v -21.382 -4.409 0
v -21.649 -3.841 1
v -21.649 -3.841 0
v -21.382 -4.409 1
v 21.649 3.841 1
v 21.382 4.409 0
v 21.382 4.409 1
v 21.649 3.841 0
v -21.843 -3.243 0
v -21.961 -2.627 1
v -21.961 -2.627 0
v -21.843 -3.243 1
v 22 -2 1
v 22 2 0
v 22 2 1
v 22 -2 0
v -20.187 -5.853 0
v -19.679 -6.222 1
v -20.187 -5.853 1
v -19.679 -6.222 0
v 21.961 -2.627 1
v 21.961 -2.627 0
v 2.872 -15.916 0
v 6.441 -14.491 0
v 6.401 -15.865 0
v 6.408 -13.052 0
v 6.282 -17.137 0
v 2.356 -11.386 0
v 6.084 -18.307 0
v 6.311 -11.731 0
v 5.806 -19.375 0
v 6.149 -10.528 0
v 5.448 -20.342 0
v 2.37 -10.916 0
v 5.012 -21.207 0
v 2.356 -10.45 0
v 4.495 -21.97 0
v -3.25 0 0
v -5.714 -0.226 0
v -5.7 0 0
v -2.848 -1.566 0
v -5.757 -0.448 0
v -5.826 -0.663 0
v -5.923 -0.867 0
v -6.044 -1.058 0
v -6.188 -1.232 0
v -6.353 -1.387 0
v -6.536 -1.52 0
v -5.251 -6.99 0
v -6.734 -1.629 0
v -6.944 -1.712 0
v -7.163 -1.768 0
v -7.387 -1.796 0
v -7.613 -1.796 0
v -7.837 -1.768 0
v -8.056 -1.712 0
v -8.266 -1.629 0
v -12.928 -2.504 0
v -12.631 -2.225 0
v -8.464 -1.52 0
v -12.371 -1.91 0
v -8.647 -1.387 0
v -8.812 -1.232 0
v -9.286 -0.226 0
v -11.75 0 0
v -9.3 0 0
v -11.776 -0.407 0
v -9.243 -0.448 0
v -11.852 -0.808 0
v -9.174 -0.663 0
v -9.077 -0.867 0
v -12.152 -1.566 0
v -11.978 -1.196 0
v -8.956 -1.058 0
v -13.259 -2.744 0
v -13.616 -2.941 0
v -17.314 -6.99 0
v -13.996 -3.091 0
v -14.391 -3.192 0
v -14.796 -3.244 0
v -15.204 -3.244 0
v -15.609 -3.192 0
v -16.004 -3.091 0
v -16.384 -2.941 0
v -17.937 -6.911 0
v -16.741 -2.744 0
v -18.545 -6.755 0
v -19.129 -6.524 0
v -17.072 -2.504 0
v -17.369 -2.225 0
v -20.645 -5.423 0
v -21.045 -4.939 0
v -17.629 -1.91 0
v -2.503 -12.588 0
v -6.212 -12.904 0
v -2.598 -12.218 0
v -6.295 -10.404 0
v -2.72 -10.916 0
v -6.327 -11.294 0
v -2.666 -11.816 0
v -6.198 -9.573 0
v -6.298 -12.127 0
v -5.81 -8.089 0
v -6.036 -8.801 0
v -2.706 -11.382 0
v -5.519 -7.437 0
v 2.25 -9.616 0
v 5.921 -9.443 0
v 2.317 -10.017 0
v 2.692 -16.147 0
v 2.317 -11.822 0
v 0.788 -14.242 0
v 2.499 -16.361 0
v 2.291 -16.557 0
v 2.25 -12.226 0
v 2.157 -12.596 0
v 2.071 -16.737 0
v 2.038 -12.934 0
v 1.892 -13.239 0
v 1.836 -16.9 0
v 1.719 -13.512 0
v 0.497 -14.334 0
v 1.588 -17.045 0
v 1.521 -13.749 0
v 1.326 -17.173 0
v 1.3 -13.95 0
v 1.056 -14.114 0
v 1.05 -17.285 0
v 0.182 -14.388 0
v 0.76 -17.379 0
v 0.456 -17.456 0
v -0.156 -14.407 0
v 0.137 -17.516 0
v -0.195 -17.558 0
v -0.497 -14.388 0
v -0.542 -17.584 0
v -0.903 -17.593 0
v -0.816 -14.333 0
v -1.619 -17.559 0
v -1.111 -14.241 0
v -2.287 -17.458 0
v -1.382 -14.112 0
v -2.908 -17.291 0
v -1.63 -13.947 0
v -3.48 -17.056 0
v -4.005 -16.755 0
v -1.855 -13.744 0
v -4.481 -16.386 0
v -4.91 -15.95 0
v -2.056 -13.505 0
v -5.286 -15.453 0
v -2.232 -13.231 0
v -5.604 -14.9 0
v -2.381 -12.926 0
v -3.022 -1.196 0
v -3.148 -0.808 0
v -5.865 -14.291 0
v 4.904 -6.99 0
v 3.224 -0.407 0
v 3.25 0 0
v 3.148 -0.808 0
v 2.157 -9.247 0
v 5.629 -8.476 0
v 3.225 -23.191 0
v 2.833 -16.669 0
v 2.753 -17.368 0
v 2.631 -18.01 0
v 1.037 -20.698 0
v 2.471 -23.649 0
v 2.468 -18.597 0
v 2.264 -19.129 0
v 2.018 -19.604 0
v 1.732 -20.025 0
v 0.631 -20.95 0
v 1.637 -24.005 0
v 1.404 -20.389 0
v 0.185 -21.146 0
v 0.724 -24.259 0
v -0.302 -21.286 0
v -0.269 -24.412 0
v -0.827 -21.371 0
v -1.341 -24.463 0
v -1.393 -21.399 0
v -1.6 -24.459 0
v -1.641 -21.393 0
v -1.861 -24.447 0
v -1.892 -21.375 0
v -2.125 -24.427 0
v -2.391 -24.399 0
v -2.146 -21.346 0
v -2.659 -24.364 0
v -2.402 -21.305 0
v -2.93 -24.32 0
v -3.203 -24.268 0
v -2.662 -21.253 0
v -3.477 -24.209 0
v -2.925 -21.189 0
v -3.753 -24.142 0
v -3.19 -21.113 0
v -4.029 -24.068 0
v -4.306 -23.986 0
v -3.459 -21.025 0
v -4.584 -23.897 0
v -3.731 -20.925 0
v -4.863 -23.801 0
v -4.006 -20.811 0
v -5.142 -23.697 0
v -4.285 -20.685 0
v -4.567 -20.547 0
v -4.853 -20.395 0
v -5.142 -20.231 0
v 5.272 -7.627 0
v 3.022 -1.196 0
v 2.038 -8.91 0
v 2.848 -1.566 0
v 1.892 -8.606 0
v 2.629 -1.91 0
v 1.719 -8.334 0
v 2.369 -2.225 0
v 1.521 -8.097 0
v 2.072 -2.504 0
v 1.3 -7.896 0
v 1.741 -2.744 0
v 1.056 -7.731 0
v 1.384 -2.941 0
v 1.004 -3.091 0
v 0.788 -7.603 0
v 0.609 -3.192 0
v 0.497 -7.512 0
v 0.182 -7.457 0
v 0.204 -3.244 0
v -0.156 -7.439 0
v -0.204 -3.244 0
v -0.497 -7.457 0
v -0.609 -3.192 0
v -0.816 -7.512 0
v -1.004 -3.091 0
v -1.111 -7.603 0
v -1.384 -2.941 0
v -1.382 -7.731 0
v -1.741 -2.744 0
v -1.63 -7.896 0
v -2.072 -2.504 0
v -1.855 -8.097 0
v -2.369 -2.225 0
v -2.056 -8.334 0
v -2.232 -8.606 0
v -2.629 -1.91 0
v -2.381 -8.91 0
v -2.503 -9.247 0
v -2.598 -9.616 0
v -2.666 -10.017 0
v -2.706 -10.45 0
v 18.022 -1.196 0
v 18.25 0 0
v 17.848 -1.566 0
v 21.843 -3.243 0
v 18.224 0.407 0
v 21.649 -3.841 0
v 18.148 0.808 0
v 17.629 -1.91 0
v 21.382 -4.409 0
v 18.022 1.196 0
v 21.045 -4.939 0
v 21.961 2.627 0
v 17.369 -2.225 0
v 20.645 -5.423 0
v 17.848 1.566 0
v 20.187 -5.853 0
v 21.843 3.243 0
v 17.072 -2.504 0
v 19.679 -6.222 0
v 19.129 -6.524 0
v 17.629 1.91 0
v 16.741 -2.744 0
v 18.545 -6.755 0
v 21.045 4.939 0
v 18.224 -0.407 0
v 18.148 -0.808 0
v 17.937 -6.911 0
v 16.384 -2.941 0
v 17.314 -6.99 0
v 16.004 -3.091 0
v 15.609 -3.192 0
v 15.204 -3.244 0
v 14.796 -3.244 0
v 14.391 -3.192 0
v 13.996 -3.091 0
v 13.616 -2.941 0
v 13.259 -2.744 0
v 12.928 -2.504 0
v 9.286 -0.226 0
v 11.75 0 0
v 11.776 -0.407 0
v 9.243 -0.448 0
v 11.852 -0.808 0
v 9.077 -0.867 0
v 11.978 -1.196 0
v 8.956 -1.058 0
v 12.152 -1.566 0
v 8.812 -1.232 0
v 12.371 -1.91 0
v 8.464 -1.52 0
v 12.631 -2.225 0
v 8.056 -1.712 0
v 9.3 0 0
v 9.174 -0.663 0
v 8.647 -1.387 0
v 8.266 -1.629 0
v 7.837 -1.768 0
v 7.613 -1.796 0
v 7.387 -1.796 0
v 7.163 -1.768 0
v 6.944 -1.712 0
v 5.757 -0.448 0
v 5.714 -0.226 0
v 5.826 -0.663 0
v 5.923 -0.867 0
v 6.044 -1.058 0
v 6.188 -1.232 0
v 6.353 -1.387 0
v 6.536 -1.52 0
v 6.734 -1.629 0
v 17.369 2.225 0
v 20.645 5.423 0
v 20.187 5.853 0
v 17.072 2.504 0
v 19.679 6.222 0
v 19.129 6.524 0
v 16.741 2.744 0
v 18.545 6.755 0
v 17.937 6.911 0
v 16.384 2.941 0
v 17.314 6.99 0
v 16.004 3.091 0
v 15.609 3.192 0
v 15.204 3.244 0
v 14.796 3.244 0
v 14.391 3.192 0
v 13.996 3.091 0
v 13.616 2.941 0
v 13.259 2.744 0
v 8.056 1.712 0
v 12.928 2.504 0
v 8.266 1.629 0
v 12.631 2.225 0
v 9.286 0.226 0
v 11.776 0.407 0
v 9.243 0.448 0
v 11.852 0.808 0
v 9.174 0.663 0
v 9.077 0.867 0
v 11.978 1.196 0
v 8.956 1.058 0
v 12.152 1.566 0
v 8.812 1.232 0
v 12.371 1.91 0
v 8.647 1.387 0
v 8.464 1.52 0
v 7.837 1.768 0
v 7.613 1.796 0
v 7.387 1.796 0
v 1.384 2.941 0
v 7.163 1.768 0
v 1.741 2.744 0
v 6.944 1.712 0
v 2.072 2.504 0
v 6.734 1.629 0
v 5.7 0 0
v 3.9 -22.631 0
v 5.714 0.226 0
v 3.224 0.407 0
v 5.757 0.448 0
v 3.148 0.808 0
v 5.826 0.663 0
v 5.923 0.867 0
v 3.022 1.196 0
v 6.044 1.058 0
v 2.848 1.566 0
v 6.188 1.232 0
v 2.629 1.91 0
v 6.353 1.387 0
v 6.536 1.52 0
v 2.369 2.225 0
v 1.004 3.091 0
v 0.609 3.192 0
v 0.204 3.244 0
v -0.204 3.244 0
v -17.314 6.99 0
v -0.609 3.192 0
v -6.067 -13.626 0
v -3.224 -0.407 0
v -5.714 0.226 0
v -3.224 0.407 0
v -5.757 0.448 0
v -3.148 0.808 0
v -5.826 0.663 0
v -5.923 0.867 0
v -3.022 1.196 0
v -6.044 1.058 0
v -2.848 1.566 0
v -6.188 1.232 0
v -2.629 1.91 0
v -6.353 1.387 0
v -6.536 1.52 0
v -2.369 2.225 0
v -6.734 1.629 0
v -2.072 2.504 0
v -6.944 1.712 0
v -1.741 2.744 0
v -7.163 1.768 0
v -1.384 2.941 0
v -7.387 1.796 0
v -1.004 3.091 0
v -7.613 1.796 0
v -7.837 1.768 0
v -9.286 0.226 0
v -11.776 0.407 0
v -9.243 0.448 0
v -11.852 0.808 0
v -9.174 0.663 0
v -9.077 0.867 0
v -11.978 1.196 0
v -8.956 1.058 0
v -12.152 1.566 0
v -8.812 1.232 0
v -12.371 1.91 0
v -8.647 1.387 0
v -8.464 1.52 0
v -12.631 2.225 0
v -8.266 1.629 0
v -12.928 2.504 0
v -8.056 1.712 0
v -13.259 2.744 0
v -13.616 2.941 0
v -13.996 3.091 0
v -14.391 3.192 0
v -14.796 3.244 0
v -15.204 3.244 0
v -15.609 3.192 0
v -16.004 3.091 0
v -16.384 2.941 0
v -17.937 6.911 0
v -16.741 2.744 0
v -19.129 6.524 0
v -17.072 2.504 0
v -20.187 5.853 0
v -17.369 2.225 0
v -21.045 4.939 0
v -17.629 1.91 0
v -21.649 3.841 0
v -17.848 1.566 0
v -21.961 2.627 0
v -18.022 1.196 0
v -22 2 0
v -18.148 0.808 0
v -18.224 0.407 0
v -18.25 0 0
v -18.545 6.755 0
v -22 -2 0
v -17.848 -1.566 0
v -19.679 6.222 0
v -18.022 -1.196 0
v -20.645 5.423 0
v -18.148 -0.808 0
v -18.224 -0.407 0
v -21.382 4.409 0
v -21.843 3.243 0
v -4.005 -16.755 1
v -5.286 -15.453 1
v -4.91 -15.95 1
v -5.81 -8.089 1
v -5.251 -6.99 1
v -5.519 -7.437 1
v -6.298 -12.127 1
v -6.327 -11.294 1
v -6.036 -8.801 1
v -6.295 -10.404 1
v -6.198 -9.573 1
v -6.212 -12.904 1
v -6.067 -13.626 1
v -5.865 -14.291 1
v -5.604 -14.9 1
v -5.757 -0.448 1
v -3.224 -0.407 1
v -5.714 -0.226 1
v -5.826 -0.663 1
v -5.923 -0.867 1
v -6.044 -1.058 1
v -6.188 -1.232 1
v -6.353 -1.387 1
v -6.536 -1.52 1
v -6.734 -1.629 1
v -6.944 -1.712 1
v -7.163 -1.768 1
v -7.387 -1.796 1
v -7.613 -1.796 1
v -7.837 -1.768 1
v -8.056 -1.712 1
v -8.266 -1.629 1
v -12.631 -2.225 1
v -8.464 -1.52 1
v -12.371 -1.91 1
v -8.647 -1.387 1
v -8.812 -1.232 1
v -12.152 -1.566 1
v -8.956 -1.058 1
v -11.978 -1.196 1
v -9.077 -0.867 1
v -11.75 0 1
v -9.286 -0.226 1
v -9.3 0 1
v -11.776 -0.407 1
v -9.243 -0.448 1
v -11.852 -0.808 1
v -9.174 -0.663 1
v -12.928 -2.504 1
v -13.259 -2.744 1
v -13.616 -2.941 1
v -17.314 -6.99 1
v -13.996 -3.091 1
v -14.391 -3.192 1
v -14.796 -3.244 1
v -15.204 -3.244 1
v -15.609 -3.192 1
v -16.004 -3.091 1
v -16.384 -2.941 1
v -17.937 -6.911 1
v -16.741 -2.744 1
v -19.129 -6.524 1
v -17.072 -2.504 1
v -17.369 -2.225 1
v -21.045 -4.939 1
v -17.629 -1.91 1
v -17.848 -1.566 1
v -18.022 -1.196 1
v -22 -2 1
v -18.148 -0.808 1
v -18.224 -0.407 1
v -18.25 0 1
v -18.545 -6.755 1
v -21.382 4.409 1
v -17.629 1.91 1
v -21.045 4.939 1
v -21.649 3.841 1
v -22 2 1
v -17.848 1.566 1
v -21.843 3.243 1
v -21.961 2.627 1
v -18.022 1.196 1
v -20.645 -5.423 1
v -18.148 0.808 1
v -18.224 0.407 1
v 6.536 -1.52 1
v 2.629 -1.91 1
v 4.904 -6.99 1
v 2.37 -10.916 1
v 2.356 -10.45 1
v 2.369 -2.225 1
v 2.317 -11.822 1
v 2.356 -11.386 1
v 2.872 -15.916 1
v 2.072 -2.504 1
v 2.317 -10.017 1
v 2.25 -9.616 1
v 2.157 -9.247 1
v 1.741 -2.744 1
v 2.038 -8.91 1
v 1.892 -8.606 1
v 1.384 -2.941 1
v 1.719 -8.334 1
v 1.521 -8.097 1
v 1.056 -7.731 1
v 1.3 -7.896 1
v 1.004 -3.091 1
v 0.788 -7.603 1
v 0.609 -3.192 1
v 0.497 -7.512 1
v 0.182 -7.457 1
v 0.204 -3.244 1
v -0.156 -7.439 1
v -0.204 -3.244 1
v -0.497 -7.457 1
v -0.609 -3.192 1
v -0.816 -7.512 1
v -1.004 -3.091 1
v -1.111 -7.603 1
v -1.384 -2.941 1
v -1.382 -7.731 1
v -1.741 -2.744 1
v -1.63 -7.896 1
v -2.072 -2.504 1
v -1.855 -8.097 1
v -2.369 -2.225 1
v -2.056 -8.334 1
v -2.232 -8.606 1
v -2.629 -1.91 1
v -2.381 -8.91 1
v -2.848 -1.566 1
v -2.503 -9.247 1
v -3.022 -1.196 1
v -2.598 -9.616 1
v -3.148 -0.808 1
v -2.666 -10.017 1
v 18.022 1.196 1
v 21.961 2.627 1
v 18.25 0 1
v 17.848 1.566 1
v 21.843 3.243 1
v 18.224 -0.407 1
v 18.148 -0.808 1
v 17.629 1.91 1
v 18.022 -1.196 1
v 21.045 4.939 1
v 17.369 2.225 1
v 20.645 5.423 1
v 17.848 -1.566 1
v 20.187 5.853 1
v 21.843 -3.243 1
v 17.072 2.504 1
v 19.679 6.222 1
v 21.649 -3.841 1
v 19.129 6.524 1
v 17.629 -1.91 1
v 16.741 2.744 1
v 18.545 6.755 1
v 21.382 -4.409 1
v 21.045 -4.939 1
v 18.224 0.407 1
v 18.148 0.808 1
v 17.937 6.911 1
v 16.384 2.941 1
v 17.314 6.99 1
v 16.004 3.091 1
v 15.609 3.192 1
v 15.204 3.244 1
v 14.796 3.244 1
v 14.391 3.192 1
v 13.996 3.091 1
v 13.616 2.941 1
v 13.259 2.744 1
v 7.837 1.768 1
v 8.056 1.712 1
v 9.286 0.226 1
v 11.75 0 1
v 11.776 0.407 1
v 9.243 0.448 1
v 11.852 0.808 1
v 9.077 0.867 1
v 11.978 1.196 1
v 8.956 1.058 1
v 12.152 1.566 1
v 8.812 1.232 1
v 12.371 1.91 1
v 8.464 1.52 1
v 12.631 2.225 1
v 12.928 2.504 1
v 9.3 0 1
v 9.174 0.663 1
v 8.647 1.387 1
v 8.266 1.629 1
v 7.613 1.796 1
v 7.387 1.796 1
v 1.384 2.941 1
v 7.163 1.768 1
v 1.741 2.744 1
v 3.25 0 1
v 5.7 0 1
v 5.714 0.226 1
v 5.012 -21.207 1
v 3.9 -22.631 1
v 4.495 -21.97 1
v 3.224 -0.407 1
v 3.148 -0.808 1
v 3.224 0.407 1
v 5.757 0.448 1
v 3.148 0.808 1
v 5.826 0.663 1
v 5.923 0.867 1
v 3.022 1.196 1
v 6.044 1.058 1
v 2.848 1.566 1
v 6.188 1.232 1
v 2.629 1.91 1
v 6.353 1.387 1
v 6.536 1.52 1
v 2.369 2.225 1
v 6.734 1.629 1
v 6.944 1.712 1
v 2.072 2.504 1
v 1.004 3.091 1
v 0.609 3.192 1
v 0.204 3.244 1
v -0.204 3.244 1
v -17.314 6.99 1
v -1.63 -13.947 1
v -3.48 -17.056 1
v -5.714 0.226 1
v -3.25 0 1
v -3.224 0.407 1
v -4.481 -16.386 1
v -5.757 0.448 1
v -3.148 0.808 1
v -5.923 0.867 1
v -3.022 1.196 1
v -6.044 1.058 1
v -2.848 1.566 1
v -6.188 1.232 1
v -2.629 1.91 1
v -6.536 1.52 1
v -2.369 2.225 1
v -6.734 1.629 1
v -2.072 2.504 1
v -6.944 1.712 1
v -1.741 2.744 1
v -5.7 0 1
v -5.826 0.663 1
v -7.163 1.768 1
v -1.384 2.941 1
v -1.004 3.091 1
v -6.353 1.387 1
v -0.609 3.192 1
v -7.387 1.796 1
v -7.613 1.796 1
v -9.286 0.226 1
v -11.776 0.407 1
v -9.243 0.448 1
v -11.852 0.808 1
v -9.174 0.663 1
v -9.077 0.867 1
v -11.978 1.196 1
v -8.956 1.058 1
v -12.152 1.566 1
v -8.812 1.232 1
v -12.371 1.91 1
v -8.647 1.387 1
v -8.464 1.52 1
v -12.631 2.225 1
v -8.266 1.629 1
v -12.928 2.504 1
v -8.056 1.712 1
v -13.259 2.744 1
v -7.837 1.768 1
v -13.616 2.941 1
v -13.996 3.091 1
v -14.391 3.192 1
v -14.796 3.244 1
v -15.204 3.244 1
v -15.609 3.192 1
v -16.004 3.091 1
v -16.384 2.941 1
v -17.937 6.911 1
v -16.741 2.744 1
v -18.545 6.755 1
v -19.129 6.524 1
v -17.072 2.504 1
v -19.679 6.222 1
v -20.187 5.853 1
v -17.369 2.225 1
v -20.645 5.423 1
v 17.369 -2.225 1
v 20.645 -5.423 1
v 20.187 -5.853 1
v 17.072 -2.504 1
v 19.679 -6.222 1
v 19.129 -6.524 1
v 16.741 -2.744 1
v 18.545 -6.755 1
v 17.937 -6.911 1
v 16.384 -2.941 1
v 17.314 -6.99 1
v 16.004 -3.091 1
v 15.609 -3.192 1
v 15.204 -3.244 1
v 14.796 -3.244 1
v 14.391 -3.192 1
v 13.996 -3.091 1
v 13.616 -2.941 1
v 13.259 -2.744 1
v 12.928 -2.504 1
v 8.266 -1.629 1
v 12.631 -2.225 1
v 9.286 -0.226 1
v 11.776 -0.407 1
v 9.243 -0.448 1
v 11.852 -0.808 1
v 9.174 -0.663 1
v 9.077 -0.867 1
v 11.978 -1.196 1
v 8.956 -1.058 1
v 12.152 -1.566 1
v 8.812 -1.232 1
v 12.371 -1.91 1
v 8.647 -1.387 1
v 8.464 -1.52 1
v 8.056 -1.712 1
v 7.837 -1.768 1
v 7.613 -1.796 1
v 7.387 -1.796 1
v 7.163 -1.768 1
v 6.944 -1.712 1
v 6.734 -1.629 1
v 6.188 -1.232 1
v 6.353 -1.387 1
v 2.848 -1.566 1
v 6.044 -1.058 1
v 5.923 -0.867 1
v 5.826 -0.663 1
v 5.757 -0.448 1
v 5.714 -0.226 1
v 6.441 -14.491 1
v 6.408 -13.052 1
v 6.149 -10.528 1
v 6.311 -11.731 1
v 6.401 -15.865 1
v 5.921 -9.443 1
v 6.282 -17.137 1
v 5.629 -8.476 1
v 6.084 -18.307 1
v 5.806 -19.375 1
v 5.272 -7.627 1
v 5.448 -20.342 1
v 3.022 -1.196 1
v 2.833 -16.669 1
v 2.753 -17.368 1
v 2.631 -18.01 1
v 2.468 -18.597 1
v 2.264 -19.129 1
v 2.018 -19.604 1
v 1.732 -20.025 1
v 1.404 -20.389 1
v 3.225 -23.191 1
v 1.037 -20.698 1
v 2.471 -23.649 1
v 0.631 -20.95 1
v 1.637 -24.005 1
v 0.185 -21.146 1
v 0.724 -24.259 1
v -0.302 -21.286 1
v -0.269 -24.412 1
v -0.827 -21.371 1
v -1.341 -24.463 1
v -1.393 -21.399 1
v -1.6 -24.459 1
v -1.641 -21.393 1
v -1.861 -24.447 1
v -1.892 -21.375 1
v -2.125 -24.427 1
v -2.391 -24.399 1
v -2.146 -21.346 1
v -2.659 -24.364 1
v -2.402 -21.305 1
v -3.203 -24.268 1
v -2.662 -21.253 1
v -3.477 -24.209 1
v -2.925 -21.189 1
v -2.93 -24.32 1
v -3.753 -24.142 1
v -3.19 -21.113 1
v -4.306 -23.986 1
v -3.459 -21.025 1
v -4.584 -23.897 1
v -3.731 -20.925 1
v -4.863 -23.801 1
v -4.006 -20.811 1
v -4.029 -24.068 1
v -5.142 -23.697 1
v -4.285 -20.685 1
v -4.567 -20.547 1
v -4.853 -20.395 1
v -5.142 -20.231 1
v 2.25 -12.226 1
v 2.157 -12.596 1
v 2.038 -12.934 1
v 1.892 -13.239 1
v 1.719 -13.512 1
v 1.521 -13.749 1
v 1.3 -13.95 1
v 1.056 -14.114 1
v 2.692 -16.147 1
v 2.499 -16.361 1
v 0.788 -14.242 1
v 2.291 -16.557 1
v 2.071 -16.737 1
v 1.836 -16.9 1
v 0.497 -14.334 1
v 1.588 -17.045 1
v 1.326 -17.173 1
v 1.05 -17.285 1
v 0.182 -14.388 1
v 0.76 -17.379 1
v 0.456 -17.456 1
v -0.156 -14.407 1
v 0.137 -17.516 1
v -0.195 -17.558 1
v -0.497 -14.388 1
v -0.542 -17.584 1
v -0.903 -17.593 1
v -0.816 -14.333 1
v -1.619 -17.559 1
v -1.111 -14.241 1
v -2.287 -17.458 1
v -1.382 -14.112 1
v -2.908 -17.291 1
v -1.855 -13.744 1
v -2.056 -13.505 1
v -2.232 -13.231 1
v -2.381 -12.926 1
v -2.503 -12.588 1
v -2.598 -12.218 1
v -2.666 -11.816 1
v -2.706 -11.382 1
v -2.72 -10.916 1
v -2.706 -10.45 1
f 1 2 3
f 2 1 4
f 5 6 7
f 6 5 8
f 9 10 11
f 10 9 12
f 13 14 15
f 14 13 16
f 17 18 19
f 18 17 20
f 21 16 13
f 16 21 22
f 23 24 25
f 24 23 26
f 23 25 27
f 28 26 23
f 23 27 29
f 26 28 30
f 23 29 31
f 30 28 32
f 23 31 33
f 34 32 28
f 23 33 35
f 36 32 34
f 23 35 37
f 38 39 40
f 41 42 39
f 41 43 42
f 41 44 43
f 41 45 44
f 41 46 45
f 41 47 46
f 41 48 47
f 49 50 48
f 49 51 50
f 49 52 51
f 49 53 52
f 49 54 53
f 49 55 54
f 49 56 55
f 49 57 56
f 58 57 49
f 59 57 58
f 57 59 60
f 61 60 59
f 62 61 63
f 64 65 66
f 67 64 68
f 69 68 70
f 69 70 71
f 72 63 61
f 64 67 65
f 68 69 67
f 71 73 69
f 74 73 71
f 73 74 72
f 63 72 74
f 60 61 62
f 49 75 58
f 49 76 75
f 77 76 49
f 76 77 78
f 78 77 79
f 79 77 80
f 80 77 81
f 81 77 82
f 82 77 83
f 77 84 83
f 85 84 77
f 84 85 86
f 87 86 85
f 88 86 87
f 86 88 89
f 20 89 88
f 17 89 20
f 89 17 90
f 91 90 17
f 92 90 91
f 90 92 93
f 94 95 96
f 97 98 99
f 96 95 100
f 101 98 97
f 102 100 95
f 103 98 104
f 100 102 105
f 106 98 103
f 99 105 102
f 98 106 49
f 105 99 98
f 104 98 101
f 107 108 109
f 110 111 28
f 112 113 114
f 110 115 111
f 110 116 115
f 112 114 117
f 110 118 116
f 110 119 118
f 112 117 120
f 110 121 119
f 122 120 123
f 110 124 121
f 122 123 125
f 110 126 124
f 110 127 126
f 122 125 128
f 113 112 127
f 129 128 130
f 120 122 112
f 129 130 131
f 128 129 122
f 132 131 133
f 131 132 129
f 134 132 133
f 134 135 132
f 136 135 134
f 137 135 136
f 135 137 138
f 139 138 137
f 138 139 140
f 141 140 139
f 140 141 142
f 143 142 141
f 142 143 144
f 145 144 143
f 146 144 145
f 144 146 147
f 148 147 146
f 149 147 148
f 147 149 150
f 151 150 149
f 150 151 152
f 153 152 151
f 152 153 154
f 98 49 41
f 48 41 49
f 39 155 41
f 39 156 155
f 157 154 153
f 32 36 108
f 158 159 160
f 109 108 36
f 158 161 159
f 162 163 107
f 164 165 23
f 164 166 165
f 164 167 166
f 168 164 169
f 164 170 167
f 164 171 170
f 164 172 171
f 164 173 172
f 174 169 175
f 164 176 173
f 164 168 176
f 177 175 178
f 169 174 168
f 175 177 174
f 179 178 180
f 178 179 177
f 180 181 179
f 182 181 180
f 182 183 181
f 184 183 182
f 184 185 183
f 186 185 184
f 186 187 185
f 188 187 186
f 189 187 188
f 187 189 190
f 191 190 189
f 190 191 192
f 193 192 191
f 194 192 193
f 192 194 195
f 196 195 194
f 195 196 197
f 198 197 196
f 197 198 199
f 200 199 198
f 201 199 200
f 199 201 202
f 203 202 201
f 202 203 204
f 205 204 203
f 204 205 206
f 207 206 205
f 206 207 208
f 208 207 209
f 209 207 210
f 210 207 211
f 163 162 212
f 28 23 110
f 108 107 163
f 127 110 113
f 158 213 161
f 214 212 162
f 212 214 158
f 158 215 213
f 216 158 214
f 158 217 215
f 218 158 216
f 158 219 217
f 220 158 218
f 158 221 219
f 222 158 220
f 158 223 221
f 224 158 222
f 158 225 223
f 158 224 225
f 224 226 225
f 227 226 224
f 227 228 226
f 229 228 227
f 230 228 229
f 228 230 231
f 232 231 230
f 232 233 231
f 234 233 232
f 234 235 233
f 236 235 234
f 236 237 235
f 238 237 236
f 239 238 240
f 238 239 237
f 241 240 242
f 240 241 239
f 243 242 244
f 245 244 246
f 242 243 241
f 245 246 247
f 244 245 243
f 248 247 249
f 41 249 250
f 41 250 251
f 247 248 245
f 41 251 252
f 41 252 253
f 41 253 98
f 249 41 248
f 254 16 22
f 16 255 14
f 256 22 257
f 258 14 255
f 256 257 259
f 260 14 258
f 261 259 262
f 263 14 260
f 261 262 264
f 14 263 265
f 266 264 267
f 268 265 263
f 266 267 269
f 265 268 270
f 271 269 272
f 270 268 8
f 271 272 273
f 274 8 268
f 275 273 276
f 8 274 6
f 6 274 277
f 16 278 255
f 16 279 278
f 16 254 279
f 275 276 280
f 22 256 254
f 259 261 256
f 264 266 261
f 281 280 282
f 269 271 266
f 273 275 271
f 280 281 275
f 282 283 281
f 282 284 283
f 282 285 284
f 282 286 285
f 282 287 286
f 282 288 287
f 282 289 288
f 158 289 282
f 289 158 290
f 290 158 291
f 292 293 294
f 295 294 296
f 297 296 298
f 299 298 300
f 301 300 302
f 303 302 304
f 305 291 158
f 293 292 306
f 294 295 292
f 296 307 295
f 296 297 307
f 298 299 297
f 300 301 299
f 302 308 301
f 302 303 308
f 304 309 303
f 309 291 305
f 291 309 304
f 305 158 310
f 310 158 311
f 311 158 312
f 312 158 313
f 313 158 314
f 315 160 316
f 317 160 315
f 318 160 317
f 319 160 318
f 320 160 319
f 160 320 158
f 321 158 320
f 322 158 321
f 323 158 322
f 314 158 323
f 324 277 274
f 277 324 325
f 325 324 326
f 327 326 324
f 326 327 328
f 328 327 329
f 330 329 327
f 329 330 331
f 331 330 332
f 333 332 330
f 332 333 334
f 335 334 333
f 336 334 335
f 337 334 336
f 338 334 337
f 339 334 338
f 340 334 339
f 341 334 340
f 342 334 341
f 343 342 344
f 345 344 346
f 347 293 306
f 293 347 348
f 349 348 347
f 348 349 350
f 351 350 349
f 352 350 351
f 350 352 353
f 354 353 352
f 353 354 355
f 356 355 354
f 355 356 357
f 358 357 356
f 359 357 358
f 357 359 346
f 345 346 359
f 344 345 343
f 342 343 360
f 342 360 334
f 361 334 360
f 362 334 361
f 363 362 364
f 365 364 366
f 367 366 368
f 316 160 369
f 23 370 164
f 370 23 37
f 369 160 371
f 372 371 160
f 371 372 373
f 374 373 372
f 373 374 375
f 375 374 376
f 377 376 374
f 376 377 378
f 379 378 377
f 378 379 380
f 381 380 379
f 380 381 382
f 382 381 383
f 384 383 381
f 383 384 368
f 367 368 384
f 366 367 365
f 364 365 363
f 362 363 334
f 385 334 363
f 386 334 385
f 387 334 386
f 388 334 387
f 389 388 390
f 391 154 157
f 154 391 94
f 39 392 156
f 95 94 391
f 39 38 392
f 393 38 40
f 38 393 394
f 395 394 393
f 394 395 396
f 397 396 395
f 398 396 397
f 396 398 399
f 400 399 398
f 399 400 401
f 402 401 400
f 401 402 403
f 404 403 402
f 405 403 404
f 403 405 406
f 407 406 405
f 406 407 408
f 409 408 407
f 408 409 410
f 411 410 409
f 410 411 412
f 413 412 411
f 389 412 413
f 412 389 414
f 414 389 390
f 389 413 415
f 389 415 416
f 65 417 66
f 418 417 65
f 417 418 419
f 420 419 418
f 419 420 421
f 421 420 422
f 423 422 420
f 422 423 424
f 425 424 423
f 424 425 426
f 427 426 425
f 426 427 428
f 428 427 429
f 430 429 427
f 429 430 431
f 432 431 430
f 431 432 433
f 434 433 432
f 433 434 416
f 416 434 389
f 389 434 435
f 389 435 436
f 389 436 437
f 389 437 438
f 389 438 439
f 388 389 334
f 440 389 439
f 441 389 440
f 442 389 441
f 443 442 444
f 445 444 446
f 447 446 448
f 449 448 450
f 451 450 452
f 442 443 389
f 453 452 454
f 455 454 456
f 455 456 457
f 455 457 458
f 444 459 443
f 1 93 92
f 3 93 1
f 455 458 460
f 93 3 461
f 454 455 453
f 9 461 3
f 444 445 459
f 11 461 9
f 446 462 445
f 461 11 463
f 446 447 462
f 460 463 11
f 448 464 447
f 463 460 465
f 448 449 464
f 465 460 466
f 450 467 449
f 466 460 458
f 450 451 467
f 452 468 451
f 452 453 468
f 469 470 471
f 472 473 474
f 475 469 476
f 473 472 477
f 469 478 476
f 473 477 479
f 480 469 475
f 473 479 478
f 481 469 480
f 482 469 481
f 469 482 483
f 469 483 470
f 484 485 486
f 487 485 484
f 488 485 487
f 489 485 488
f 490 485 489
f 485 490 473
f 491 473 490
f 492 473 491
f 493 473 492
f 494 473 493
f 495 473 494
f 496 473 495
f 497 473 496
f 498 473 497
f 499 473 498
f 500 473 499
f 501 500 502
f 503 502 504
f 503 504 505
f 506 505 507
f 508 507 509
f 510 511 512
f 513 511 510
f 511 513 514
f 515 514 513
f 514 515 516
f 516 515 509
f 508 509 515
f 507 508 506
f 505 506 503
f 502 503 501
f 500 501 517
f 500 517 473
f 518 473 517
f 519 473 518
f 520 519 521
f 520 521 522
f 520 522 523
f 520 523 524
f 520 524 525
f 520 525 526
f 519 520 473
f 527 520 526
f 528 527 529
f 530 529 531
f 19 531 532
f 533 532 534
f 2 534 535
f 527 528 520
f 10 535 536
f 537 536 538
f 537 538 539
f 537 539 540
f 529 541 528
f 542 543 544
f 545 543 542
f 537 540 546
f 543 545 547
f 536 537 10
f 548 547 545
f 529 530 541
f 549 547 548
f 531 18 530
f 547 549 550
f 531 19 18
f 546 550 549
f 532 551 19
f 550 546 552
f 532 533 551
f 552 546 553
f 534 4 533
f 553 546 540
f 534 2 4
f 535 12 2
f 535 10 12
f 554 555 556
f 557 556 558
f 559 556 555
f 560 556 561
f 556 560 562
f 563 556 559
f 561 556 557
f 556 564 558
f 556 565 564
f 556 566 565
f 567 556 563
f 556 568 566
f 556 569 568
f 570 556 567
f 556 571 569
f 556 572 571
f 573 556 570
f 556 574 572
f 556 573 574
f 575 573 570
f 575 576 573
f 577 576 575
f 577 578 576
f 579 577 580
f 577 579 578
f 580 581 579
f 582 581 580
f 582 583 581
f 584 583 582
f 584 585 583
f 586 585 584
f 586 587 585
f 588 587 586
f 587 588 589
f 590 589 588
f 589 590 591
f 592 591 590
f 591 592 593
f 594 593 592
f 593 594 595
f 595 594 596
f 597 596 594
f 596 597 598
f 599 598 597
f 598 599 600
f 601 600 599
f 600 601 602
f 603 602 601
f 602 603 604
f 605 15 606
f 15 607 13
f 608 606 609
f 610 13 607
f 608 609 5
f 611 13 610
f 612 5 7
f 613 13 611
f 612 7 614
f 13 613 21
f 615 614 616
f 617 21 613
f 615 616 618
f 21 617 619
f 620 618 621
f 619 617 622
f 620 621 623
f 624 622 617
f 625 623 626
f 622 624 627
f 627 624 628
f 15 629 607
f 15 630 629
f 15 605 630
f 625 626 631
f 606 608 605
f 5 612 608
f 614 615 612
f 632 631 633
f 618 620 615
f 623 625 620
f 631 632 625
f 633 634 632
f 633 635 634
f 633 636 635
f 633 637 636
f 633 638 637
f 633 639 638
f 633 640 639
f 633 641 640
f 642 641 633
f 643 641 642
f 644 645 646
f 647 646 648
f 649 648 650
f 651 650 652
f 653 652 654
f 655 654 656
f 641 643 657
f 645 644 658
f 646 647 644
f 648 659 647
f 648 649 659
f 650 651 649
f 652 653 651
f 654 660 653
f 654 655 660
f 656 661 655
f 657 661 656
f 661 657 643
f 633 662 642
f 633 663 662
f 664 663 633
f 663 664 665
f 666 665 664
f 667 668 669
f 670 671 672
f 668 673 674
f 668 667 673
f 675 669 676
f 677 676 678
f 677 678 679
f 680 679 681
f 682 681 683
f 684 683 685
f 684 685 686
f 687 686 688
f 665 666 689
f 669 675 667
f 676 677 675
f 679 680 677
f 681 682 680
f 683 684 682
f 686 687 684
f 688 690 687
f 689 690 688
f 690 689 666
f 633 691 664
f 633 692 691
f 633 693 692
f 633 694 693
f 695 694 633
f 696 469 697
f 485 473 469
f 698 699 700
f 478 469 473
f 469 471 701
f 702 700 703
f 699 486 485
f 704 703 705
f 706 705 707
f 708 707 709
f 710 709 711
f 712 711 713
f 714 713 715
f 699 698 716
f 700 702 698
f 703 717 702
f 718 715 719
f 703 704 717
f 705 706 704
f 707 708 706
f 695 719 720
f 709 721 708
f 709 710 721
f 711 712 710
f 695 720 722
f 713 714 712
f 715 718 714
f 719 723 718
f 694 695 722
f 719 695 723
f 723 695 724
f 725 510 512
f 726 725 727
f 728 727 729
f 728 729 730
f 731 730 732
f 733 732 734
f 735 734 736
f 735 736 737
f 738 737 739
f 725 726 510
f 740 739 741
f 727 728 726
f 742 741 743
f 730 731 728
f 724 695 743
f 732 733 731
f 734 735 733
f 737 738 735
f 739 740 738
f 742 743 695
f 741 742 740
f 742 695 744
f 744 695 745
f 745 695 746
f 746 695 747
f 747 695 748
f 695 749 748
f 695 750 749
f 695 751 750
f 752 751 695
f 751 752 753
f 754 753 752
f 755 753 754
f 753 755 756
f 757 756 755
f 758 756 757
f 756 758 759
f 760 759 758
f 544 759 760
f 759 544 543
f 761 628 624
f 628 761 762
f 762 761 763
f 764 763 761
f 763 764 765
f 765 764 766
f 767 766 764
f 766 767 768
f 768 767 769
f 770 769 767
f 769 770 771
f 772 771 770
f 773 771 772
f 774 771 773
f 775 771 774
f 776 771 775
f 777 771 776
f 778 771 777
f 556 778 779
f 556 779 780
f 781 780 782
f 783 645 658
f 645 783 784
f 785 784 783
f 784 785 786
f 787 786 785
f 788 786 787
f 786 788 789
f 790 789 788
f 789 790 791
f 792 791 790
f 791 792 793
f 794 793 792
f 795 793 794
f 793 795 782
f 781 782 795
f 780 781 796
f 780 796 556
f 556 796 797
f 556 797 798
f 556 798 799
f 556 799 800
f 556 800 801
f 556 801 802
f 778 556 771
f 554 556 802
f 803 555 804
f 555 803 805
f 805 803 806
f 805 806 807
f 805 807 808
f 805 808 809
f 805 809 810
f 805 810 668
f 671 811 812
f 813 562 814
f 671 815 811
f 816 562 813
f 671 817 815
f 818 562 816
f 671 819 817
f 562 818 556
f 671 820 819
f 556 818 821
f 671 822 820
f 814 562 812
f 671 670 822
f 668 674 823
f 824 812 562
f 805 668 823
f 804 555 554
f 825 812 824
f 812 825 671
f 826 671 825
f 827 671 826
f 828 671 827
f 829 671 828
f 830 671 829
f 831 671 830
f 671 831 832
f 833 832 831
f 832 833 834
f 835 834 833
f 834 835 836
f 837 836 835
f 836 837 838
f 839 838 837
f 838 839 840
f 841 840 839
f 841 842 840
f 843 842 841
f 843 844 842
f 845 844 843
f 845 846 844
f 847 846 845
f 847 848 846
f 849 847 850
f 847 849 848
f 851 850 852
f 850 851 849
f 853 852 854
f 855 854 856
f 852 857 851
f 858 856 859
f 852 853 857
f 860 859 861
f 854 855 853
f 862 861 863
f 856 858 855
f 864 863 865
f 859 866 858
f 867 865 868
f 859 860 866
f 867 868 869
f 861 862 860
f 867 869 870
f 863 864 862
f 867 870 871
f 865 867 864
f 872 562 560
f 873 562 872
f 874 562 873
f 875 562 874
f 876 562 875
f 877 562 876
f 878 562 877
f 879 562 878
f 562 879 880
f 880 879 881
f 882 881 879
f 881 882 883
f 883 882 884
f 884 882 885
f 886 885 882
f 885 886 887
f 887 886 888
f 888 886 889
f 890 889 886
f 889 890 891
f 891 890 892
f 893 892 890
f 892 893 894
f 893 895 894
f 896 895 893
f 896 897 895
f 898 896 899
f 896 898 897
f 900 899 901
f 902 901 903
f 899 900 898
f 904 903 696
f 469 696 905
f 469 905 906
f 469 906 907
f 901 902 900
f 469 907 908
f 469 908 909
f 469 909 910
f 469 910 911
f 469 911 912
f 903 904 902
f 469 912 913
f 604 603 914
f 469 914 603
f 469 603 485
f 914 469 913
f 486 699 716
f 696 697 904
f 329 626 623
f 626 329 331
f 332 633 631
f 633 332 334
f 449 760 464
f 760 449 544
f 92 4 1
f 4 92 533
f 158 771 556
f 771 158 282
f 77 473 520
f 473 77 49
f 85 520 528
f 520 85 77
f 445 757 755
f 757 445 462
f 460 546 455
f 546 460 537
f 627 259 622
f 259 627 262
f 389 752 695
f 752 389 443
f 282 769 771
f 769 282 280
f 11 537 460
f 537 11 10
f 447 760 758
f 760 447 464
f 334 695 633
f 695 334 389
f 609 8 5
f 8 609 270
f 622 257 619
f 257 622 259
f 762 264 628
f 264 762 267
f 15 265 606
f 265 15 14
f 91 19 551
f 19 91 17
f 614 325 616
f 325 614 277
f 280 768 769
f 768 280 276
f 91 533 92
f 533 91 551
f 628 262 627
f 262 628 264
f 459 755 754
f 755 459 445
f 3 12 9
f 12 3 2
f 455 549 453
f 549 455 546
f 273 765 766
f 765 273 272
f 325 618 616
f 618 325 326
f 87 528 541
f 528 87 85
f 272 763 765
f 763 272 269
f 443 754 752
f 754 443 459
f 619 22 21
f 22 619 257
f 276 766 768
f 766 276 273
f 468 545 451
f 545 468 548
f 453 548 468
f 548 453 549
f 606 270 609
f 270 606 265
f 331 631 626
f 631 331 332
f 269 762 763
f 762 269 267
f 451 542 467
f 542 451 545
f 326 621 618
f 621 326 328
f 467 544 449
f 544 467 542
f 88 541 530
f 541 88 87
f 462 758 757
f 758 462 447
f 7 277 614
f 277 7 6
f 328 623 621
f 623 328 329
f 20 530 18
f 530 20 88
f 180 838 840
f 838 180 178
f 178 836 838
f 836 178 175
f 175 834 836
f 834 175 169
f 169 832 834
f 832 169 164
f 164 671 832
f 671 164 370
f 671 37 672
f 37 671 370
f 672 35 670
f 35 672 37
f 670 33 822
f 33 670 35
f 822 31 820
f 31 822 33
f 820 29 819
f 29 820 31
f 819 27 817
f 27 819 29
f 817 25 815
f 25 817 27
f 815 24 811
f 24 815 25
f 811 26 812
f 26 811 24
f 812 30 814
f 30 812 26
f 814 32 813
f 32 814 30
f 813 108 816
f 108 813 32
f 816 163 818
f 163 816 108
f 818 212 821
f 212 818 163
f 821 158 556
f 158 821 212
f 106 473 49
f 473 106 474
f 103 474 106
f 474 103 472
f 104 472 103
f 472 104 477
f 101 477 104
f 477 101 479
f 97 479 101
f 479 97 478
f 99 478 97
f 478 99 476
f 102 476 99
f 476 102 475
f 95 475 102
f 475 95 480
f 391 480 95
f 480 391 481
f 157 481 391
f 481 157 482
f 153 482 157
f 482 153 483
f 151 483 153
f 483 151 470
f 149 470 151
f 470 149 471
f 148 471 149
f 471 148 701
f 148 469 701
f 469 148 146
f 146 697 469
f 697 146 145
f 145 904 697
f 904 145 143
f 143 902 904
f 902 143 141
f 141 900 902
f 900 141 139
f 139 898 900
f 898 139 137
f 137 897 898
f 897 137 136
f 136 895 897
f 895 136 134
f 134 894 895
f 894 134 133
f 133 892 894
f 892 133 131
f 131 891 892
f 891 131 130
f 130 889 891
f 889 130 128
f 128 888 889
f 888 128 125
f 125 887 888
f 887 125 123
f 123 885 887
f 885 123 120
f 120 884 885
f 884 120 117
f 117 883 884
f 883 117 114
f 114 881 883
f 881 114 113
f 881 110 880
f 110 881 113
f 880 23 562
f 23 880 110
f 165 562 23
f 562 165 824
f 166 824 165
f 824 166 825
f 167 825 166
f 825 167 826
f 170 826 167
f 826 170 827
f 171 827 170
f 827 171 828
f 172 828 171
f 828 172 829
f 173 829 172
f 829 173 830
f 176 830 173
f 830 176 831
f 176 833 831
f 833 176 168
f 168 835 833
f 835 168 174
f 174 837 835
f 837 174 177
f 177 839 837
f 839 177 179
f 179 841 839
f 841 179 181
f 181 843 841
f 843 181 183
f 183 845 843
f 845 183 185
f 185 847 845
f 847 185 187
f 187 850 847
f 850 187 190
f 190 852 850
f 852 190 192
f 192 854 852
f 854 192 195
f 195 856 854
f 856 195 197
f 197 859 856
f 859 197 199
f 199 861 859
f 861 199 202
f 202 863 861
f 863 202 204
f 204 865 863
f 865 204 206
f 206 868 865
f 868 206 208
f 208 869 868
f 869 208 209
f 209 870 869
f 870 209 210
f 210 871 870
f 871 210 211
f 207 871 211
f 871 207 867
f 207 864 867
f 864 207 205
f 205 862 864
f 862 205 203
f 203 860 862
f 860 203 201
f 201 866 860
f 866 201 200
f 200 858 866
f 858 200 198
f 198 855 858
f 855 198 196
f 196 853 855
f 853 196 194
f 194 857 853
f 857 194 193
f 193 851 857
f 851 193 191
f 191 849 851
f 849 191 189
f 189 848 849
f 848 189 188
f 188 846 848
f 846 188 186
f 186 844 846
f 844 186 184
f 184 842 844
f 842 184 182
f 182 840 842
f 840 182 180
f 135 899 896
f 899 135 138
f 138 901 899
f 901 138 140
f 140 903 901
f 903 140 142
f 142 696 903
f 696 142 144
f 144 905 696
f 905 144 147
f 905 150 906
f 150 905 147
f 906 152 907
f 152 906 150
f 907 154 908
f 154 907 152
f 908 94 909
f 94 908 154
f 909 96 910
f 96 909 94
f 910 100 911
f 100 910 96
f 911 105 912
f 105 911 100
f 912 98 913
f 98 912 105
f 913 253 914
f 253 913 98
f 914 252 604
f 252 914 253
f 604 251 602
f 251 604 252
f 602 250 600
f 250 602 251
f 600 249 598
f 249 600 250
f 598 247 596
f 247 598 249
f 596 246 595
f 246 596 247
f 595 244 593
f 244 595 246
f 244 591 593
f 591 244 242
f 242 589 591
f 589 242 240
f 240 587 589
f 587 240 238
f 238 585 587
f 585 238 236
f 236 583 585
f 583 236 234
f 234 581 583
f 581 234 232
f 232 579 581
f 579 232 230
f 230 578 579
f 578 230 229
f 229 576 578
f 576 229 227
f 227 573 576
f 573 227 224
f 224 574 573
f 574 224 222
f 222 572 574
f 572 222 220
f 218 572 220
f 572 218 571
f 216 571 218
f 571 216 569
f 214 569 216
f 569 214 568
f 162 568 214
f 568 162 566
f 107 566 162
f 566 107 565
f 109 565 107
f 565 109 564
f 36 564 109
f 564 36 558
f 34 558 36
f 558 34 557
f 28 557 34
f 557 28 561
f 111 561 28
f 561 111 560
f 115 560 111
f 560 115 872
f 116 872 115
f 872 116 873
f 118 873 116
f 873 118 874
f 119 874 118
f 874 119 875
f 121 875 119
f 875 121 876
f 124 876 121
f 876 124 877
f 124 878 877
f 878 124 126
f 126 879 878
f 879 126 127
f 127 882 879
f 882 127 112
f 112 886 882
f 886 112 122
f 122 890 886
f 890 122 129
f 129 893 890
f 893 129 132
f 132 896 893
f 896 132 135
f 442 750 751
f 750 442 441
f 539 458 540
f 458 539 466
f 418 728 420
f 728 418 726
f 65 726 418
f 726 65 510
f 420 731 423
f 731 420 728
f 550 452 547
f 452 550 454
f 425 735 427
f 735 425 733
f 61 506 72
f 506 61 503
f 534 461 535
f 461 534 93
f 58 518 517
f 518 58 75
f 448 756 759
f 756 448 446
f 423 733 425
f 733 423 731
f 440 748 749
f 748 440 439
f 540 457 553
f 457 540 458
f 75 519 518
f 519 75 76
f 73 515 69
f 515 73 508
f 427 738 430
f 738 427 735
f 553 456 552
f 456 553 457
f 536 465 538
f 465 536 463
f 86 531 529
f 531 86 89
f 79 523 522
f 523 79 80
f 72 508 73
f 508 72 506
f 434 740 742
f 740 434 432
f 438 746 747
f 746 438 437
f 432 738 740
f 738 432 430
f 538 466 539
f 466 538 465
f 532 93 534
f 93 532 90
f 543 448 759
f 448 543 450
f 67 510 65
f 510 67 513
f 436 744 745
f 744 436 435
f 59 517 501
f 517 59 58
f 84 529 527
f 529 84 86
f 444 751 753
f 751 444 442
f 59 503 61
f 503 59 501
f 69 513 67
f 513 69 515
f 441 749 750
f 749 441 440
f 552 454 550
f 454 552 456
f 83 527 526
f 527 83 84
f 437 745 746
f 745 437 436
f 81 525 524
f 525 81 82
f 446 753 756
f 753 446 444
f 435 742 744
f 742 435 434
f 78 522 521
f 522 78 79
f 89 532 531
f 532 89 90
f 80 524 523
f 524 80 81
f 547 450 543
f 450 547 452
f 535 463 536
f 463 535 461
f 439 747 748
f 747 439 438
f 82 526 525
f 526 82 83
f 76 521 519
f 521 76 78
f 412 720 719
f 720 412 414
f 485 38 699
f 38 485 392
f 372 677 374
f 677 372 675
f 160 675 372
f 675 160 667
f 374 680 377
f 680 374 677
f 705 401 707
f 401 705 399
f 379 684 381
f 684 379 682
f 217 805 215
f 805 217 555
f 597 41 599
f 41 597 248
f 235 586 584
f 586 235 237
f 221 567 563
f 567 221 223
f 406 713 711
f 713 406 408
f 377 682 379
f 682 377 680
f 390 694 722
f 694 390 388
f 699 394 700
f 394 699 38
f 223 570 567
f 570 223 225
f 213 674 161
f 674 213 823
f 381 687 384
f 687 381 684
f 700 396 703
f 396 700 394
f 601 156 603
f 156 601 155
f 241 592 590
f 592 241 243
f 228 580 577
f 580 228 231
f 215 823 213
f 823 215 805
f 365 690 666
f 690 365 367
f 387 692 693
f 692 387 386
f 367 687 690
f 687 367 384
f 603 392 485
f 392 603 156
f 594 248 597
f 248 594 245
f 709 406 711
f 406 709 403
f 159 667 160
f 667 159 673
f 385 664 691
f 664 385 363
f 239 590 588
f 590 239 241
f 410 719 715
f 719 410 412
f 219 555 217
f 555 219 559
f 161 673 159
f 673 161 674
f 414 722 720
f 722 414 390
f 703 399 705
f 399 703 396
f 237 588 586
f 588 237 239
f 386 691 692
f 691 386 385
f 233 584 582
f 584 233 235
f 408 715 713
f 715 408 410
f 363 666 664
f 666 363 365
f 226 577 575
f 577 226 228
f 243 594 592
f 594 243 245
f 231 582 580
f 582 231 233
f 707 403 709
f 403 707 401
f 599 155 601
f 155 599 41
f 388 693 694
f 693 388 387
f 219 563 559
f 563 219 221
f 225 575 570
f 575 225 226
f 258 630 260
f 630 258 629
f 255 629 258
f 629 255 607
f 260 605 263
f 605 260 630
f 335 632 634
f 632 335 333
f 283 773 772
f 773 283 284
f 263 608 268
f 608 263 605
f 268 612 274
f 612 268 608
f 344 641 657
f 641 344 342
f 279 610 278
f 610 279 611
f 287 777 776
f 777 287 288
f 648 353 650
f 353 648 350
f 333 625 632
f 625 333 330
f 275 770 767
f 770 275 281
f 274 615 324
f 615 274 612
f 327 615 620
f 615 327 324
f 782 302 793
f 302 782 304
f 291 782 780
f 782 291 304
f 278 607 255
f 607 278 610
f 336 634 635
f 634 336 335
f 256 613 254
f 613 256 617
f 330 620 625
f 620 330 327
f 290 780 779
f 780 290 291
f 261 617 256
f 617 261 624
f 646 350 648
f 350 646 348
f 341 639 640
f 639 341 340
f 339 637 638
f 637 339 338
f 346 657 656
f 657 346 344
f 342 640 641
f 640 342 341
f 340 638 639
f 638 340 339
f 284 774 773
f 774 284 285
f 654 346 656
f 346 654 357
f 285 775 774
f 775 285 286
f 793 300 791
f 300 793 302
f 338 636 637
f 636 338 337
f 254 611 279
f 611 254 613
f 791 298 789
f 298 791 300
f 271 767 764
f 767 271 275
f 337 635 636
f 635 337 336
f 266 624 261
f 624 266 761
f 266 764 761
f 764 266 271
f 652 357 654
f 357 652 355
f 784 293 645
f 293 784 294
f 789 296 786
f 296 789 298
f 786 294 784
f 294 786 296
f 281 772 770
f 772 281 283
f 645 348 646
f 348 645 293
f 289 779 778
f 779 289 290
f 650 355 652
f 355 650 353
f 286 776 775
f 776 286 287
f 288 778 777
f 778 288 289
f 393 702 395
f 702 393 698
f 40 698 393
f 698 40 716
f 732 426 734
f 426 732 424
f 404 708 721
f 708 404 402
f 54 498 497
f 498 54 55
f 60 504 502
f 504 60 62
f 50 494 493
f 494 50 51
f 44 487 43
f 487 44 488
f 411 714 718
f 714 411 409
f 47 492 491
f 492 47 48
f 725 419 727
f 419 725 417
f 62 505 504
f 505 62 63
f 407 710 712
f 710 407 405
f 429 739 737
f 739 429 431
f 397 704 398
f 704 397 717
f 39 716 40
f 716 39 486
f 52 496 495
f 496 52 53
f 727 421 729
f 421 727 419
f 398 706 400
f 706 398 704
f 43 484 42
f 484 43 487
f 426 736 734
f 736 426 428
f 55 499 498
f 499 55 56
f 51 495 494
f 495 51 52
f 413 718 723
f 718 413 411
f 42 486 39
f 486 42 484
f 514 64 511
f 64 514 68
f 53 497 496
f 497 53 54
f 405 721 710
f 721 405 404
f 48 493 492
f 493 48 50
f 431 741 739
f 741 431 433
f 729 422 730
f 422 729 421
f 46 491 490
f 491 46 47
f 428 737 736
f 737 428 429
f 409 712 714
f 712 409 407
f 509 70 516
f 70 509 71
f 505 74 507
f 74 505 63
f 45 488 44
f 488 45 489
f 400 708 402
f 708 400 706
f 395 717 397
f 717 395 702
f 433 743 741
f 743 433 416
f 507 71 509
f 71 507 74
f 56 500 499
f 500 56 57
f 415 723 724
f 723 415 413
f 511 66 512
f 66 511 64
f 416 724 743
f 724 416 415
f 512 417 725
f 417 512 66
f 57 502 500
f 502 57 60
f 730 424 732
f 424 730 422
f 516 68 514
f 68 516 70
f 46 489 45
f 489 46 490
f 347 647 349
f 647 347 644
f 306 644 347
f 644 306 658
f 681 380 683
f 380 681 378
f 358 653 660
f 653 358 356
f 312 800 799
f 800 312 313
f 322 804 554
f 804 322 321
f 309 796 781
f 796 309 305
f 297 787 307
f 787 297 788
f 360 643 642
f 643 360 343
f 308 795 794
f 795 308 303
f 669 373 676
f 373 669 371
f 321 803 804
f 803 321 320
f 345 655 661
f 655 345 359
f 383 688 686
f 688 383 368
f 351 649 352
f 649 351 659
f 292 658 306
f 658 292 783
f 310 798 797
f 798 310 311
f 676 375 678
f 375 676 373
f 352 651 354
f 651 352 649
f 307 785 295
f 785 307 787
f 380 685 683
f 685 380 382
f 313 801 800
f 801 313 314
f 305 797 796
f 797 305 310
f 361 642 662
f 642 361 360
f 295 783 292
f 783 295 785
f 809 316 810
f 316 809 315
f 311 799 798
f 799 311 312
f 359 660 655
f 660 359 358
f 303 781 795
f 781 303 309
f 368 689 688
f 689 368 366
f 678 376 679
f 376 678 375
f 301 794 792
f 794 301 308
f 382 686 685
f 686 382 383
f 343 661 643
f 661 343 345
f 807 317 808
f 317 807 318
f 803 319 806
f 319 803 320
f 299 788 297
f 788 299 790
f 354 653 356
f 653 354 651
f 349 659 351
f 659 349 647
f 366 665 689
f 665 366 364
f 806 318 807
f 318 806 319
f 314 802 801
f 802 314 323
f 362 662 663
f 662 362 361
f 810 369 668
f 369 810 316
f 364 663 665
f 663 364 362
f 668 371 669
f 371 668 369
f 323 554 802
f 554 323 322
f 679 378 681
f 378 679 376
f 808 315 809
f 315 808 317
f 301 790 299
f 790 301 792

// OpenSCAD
$fn = 50;


difference() {
	union() {
		*color(alpha = 1.0000000000, c = "gray") {
			translate(v = [0, 14, 0]) {
				linear_extrude(height = 1) {
					text(font = "Arial:style=Bold", halign = "center", size = 4.5000000000, text = "COMMENT description oobb_plate_shape_p_type_1_depth_3_width_1_thickness_9_extra_oobb_size", valign = "center");
				}
			}
		}
		hull() {
			translate(v = [-17.0000000000, 2.0000000000, 0]) {
				cylinder(h = 1, r = 5);
			}
			translate(v = [17.0000000000, 2.0000000000, 0]) {
				cylinder(h = 1, r = 5);
			}
			translate(v = [-17.0000000000, -2.0000000000, 0]) {
				cylinder(h = 1, r = 5);
			}
			translate(v = [17.0000000000, -2.0000000000, 0]) {
				cylinder(h = 1, r = 5);
			}
		}
		translate(v = [0, -5, 0]) {
			linear_extrude(height = 1) {
				text(font = "DejaVu Sans Mono:style=Bold", halign = "center", size = 19.0000000000, text = "9", valign = "top");
			}
		}
	}
	union() {
		*color(alpha = 1.0000000000, c = "gray") {
			translate(v = [0, 14, 0]) {
				linear_extrude(height = 1) {
					text(font = "Arial:style=Bold", halign = "center", size = 4.5000000000, text = "COMMENT description oobb_holes_shape_n_type_3_width_1_thickness_9_extra_oobb_size_1_height_'all'_holes_true_both_holes", valign = "center");
				}
			}
		}
		translate(v = [-15.0000000000, 0.0000000000, 0]) {
			translate(v = [0, 0, -50]) {
				cylinder(h = 100, r = 3.2500000000);
			}
		}
		translate(v = [0, 0, -50]) {
			cylinder(h = 100, r = 3.2500000000);
		}
		translate(v = [15.0000000000, 0.0000000000, 0]) {
			translate(v = [0, 0, -50]) {
				cylinder(h = 100, r = 3.2500000000);
			}
		}
		translate(v = [-15.0000000000, 0.0000000000, 0]) {
			translate(v = [0, 0, -50]) {
				cylinder(h = 100, r = 1.8000000000);
			}
		}
		translate(v = [-7.5000000000, 0.0000000000, 0]) {
			translate(v = [0, 0, -50]) {
				cylinder(h = 100, r = 1.8000000000);
			}
		}
		translate(v = [0, 0, -50]) {
			cylinder(h = 100, r = 1.8000000000);
		}
		translate(v = [7.5000000000, 0.0000000000, 0]) {
			translate(v = [0, 0, -50]) {
				cylinder(h = 100, r = 1.8000000000);
			}
		}
		translate(v = [15.0000000000, 0.0000000000, 0]) {
			translate(v = [0, 0, -50]) {
				cylinder(h = 100, r = 1.8000000000);
			}
		}
	}
}
